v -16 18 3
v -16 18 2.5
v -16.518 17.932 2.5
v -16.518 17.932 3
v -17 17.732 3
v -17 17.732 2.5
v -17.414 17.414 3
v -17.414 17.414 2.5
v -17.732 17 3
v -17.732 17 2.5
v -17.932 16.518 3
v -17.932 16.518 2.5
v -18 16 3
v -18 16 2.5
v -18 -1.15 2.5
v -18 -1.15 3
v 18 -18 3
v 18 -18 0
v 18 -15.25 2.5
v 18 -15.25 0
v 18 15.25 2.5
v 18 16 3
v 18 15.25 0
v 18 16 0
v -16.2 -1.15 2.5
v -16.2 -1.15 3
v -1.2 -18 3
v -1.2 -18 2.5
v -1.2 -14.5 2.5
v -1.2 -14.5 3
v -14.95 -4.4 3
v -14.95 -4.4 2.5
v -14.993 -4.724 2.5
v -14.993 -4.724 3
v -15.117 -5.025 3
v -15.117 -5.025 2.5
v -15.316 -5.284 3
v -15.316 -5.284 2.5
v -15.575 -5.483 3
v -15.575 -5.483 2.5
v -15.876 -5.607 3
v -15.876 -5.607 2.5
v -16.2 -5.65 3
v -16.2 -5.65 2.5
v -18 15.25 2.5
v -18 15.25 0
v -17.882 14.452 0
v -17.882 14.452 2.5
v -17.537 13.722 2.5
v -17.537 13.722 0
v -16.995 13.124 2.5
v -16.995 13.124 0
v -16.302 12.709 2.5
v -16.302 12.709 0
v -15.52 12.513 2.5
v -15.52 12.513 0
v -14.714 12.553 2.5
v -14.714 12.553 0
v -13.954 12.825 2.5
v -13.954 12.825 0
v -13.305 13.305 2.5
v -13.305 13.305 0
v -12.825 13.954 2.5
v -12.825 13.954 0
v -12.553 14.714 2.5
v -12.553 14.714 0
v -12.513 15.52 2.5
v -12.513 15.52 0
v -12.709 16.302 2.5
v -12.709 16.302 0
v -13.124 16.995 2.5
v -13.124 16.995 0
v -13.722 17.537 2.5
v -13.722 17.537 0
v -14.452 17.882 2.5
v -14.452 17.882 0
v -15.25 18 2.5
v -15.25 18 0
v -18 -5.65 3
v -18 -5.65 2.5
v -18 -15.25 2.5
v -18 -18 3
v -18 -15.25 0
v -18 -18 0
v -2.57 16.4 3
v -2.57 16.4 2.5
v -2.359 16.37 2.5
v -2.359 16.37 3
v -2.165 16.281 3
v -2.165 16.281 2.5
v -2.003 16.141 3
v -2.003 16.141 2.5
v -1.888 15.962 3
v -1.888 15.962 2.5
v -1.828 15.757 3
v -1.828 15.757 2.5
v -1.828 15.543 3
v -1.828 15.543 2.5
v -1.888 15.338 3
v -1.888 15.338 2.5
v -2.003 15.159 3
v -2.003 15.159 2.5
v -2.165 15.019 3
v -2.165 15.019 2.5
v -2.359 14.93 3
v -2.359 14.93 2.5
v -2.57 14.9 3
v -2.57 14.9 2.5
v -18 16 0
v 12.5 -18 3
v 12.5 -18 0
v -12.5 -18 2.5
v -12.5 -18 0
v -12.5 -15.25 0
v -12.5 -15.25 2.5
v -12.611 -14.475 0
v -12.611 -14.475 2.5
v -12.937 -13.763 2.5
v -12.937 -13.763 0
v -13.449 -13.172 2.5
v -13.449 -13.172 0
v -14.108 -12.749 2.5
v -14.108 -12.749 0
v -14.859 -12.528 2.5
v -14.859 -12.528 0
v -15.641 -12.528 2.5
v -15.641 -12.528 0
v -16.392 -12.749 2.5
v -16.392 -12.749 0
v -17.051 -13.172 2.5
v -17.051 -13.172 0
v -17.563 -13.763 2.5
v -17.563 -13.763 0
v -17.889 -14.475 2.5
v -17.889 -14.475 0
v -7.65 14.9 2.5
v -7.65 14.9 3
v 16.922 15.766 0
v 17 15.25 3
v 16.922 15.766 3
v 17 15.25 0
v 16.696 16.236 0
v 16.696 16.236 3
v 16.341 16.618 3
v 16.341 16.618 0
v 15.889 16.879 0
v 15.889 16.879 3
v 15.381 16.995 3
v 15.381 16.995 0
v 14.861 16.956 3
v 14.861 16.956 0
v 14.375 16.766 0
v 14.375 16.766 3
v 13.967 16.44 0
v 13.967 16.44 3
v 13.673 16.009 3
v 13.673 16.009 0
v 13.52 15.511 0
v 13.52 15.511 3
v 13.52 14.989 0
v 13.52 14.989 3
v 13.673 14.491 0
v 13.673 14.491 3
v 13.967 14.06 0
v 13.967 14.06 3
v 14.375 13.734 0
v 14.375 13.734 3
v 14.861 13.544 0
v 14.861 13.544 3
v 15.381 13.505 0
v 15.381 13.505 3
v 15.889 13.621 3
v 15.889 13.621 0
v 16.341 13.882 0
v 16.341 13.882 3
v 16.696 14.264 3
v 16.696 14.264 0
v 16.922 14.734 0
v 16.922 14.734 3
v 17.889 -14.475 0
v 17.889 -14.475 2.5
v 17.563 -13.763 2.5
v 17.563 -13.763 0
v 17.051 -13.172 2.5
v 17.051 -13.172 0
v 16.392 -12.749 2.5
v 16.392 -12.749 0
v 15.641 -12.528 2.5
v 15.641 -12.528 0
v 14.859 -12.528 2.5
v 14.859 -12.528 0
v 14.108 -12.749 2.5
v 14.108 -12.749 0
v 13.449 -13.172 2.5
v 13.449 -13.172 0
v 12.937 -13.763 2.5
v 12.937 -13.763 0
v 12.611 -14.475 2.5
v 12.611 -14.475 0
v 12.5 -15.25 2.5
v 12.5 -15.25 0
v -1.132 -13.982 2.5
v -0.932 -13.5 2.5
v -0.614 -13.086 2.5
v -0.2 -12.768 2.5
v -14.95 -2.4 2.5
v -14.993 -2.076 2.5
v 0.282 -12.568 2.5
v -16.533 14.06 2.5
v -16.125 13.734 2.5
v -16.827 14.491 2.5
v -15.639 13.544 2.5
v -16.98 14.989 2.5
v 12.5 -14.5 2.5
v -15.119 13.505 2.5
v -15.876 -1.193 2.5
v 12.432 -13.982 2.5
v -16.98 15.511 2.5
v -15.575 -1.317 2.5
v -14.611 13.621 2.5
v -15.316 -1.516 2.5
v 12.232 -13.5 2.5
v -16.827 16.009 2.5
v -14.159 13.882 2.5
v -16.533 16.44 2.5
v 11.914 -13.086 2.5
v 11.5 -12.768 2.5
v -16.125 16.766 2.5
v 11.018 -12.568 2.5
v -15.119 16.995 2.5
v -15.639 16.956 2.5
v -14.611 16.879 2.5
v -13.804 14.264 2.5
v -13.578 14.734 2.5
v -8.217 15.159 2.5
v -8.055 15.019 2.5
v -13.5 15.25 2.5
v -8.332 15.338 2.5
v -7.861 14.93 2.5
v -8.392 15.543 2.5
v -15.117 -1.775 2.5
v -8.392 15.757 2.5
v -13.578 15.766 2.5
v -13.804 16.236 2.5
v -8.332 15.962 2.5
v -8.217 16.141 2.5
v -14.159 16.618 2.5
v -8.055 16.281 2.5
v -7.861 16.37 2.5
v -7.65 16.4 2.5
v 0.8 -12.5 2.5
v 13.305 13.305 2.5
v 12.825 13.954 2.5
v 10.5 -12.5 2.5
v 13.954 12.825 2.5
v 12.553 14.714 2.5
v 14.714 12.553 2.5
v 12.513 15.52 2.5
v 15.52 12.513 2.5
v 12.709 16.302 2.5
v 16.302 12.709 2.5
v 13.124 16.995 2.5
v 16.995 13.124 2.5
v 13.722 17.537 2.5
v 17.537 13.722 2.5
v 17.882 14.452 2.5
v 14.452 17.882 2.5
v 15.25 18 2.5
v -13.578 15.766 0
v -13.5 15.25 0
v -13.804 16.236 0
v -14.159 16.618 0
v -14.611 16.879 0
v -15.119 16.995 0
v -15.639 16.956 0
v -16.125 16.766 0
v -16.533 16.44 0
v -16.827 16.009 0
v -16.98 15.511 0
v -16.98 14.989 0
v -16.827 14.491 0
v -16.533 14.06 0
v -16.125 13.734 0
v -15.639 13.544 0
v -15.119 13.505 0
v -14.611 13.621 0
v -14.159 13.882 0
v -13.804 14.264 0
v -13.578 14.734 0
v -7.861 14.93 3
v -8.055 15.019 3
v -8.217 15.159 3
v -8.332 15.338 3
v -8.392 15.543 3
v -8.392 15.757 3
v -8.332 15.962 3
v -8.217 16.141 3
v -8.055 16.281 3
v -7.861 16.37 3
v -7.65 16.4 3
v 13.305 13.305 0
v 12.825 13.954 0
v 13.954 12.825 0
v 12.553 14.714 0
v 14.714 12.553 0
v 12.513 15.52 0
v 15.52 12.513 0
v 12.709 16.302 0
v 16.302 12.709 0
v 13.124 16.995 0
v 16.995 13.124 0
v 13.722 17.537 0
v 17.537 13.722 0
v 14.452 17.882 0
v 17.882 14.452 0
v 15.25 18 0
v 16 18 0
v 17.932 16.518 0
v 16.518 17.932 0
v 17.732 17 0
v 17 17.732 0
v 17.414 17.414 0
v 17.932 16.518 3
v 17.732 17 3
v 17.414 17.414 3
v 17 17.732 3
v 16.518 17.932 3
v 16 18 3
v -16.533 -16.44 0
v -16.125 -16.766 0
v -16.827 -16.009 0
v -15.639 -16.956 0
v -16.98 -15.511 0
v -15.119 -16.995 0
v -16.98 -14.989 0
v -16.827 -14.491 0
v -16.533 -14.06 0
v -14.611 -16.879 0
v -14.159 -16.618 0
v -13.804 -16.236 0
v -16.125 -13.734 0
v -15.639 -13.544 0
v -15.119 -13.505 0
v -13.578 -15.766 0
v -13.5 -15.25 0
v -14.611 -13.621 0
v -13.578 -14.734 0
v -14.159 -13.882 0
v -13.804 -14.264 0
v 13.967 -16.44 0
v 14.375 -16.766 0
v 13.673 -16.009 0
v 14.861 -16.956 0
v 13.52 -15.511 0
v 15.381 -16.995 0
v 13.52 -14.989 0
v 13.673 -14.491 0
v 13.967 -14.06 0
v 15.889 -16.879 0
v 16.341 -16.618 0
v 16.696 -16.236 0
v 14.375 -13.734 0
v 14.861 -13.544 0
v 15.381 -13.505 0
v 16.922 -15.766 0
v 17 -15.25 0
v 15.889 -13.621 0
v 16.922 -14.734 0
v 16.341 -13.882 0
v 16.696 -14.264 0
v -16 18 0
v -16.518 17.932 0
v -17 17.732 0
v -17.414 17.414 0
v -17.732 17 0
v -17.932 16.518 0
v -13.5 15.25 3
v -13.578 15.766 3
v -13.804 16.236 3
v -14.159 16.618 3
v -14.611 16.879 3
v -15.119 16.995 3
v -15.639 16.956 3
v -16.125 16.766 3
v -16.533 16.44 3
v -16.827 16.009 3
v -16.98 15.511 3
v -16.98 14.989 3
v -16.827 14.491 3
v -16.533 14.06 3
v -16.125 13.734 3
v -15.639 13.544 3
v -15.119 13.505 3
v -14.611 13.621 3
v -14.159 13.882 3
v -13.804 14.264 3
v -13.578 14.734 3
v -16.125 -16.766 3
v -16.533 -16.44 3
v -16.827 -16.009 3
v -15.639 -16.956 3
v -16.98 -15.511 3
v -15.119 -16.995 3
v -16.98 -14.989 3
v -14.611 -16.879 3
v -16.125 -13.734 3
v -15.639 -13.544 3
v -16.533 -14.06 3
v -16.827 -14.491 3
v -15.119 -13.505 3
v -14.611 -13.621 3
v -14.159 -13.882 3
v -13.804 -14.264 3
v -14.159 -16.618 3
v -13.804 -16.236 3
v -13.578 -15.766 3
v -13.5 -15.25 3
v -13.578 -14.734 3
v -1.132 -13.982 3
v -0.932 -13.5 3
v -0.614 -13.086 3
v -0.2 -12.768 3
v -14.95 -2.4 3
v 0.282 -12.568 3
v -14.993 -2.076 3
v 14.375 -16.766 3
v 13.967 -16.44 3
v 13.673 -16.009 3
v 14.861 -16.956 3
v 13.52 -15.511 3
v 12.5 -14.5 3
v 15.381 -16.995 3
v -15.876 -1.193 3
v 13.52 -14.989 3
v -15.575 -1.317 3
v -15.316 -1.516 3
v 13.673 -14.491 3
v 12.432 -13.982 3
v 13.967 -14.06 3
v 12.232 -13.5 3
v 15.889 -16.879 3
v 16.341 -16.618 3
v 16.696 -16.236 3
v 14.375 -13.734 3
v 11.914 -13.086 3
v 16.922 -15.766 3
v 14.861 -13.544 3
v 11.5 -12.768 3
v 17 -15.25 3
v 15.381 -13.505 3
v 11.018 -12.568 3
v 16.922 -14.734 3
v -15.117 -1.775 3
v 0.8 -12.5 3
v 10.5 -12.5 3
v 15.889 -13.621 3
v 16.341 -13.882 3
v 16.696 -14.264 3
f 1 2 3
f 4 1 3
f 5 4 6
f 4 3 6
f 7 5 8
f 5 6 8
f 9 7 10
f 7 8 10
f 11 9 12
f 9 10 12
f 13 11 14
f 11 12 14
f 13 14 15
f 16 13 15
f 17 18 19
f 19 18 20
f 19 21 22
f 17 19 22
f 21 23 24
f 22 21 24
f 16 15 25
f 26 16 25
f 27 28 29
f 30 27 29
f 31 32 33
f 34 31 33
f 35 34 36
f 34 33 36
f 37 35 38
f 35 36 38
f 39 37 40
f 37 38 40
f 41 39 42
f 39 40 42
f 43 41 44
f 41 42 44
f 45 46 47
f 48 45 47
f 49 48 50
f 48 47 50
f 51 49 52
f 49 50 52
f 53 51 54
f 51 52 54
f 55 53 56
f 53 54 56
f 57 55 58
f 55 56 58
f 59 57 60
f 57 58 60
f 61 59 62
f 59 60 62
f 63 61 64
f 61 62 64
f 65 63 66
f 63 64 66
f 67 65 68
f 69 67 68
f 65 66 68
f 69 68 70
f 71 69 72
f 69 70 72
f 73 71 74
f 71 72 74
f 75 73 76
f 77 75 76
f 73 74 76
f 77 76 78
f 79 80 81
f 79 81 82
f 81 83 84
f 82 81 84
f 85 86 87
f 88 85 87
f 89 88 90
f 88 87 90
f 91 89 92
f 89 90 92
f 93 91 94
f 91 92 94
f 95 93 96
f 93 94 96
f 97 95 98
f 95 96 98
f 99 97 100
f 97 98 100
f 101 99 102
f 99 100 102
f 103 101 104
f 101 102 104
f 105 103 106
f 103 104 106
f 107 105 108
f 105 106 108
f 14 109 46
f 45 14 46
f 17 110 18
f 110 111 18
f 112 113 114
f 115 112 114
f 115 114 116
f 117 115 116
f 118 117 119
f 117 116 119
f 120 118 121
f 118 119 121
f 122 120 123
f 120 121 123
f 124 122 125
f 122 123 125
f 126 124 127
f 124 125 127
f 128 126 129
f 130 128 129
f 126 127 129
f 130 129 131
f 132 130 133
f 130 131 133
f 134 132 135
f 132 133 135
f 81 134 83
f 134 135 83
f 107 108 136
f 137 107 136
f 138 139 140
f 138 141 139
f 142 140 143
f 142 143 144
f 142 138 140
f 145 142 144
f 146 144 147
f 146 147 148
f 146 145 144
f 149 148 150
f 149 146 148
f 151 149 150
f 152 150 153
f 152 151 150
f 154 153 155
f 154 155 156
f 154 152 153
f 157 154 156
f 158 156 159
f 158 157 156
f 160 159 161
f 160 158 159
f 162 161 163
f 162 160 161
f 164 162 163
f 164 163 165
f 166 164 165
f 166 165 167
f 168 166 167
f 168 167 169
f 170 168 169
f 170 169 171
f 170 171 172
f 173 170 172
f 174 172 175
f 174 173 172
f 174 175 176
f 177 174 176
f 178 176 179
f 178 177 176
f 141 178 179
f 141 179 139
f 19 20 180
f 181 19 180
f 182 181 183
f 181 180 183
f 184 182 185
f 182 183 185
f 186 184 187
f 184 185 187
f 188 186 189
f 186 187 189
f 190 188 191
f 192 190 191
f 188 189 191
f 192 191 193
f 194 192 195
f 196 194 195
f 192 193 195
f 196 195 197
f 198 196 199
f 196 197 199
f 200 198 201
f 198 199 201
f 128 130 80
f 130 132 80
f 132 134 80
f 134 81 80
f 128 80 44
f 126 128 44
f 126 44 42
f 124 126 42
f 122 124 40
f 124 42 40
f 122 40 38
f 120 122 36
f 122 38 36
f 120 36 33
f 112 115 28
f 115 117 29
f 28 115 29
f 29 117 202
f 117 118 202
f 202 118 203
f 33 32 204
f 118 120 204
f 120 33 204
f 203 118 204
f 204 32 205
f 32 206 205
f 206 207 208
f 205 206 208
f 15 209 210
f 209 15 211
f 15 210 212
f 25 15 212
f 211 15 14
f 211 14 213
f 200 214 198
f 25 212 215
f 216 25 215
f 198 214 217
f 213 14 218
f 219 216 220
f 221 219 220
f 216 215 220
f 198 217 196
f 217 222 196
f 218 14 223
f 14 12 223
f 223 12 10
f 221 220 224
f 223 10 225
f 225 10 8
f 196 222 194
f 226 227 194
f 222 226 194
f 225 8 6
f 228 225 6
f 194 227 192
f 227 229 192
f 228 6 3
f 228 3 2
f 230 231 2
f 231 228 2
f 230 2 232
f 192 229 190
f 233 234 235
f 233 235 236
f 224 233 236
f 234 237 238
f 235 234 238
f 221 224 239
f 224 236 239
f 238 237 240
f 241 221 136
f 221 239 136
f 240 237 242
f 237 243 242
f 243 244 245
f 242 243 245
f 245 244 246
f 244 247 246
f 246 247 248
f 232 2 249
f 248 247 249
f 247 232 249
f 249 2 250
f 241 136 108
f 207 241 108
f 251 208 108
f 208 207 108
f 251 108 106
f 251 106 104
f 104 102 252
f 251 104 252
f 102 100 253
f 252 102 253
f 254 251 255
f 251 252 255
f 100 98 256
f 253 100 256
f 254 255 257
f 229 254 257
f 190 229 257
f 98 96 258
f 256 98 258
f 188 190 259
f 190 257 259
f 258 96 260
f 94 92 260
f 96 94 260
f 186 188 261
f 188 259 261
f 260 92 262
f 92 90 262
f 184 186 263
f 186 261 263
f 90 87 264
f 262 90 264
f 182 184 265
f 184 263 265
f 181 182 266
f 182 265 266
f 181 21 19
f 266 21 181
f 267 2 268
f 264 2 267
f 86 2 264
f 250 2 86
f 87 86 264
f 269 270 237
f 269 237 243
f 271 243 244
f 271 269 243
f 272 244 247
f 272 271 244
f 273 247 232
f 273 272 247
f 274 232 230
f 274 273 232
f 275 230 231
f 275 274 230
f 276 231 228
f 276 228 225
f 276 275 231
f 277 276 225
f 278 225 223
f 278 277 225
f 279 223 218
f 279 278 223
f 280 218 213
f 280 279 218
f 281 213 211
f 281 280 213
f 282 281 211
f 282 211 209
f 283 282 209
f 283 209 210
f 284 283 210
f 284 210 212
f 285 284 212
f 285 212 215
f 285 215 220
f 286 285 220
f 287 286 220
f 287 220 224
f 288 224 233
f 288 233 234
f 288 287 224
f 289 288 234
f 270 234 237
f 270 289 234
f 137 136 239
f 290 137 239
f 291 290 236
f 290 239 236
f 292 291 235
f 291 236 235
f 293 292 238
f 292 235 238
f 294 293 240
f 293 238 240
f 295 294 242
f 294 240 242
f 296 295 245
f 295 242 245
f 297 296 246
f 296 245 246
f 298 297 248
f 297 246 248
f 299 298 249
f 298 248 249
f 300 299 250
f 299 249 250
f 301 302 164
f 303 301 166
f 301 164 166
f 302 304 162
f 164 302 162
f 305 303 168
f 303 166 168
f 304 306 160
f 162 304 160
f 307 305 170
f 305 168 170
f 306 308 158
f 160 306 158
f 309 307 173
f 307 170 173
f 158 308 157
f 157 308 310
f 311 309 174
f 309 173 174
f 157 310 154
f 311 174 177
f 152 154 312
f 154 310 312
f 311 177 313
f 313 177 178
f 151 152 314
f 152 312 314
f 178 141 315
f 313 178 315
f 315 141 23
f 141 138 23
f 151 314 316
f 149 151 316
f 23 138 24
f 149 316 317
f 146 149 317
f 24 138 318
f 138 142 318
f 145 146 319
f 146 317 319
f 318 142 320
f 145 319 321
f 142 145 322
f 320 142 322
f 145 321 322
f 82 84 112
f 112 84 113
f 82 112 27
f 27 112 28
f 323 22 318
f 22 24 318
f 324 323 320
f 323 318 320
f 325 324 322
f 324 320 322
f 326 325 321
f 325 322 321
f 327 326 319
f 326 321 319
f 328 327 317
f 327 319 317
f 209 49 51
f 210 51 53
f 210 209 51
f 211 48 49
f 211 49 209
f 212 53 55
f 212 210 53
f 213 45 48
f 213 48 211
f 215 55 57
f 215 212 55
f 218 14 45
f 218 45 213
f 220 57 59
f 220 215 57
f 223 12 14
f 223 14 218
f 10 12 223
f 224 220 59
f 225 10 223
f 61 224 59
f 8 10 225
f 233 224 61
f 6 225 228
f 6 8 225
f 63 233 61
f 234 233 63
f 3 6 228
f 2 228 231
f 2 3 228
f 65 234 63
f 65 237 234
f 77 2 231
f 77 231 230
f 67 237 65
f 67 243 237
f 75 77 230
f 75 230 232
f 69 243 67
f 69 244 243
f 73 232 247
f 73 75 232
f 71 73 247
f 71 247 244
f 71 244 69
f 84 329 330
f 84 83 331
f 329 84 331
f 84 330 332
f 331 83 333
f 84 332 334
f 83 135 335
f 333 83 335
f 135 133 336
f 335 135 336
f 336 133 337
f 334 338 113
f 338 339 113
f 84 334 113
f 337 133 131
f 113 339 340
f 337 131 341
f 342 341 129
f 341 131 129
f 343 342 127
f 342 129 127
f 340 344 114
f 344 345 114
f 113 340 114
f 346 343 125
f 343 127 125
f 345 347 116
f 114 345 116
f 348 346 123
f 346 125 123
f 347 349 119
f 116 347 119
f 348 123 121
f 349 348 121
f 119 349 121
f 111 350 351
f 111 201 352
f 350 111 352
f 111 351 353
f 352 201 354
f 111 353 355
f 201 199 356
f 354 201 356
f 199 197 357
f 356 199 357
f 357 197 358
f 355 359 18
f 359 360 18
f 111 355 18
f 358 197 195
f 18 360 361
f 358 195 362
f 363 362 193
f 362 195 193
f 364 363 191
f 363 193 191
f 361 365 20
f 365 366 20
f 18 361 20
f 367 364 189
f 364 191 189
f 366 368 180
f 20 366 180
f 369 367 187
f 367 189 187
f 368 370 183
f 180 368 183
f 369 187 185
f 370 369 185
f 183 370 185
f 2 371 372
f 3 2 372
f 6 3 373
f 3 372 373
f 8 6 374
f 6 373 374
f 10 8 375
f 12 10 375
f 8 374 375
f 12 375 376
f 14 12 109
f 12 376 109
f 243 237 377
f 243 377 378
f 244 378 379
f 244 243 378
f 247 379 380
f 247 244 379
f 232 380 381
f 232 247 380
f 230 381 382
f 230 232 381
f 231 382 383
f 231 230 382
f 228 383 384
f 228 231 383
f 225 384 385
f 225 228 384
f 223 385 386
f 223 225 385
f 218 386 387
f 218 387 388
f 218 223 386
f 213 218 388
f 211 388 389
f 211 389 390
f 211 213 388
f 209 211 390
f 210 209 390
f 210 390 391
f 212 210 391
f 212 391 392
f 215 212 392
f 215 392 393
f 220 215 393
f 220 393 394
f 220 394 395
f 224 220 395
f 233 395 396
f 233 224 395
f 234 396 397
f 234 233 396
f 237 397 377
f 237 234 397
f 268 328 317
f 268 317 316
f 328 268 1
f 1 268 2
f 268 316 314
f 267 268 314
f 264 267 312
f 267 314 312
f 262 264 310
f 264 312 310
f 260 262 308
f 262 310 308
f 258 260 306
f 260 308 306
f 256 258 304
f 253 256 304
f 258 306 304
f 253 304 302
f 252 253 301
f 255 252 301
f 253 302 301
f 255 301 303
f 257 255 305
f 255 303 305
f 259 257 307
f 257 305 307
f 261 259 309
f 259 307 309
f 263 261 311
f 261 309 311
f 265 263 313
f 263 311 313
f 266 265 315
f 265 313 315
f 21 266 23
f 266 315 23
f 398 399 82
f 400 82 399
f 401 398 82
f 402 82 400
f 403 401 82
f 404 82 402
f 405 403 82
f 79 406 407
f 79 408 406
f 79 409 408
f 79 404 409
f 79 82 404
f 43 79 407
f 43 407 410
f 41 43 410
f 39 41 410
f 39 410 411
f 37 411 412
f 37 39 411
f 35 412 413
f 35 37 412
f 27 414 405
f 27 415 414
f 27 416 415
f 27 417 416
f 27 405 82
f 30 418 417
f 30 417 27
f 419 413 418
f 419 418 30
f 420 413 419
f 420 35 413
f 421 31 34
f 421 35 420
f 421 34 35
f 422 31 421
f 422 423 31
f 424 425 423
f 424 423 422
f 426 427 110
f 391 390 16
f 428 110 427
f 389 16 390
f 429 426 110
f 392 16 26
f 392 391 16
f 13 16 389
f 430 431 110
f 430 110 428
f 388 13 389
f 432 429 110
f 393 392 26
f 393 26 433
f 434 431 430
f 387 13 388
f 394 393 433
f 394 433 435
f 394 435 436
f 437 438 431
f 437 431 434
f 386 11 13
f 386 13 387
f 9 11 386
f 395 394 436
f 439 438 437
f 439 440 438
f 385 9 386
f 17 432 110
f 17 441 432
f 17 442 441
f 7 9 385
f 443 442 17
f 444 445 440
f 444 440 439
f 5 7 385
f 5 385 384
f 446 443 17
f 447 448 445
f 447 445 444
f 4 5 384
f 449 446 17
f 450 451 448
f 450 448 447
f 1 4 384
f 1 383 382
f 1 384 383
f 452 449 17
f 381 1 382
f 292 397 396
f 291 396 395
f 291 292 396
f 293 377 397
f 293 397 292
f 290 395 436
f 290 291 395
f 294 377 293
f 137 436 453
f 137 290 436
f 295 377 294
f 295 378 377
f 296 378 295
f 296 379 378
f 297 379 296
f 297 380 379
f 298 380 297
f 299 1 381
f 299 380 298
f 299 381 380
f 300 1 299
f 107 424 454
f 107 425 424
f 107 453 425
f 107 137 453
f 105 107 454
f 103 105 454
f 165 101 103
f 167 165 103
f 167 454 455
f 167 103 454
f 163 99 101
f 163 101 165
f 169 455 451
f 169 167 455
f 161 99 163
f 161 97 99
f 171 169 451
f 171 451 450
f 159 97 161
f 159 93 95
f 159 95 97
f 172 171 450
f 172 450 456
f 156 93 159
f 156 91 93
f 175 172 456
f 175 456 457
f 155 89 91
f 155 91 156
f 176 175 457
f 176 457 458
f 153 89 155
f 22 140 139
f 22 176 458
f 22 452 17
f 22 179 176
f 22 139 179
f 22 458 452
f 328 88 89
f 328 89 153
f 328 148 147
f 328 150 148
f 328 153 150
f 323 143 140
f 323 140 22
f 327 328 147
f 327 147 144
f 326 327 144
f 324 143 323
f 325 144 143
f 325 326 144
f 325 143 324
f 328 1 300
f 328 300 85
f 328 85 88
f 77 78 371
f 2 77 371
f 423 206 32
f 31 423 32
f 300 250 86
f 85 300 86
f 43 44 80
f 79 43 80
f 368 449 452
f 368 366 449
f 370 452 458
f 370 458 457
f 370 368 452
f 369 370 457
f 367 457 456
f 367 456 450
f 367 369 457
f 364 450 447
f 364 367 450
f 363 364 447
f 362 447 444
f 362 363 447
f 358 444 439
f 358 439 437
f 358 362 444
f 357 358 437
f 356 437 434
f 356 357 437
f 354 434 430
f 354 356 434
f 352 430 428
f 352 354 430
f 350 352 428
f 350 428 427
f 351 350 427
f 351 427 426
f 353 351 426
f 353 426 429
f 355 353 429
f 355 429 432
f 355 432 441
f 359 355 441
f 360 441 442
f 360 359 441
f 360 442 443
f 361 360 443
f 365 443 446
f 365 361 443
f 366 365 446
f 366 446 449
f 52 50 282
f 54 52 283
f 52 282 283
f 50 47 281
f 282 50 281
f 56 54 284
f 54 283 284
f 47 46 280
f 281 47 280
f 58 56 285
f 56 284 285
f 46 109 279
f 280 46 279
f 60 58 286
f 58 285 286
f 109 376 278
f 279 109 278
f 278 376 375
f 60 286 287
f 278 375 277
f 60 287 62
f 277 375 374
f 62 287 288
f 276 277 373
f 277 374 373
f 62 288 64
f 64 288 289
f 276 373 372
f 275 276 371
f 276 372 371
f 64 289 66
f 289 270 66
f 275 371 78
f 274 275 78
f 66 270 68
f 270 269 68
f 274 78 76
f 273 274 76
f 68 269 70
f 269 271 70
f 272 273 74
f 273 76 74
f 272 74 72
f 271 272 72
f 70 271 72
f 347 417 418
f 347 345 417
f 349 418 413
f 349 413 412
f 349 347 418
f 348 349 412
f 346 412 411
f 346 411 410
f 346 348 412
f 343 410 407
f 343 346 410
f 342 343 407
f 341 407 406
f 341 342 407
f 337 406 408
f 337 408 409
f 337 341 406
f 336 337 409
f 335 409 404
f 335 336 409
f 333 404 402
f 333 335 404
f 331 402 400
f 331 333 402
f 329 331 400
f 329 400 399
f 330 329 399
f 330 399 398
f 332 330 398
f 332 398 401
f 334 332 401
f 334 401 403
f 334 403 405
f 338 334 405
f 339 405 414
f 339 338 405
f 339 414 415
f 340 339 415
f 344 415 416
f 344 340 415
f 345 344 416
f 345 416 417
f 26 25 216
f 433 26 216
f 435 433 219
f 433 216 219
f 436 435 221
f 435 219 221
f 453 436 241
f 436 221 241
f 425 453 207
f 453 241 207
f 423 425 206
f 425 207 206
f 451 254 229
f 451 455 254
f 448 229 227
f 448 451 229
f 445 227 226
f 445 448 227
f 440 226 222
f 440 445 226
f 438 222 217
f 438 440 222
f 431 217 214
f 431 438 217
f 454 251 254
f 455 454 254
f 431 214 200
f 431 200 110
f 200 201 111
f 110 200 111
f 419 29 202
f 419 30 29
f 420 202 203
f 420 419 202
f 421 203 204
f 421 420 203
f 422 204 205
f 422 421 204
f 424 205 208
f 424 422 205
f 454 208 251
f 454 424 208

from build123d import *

# Parameters (mm, degrees)
SKETCH2_R         = 1.75
STANDOFFS_DEPTH   = 2.5
STANDOFFS_2_DEPTH = 2.5
STANDOFFS_3_DEPTH = 2.5
STANDOFFS_4_DEPTH = 2.5
SKETCH3_R         = 1.75
COVER_DEPTH       = 0.5
FILLETS_R         = 2


with BuildPart() as part:
    # Sketch2 → Standoffs (new body)
    with BuildSketch(Plane.XY):
        with BuildLine():
            Line((18, -18), (18, -15.25))
            ThreePointArc((18, -15.25), (15.25, -12.5), (12.5, -15.25))
            Line((12.5, -15.25), (12.5, -18))
            Line((12.5, -18), (18, -18))
        make_face()
        with Locations((15.25, -15.25)):
            Circle(SKETCH2_R, mode=Mode.SUBTRACT)
    extrude(amount=STANDOFFS_DEPTH)



with BuildPart() as body_2:
    # Sketch2 → Standoffs 2 (new body)
    with BuildSketch(Plane.XY):
        with BuildLine():
            Line((-12.5, -18), (-12.5, -15.25))
            ThreePointArc((-12.5, -15.25), (-15.250000002, -12.5), (-18, -15.250000004))
            Line((-18, -15.250000004), (-18, -18))
            Line((-18, -18), (-12.5, -18))
        make_face()
        with Locations((-15.25, -15.25)):
            Circle(SKETCH2_R, mode=Mode.SUBTRACT)
    extrude(amount=STANDOFFS_2_DEPTH)


with BuildPart() as body_3:
    # Sketch2 → Standoffs 3 (new body)
    with BuildSketch(Plane.XY):
        with BuildLine():
            Line((16, 18), (15.25, 18))
            ThreePointArc((15.25, 18), (13.305456352, 13.305456352), (18, 15.25))
            Line((18, 15.25), (18, 16))
            ThreePointArc((18, 16), (17.414213562, 17.414213562), (16, 18))
        make_face()
        with Locations((15.25, 15.25)):
            Circle(SKETCH2_R, mode=Mode.SUBTRACT)
    extrude(amount=STANDOFFS_3_DEPTH)


with BuildPart() as body_4:
    # Sketch2 → Standoffs 4 (new body)
    with BuildSketch(Plane.XY):
        with BuildLine():
            Line((-18, 16), (-18, 15.25))
            ThreePointArc((-18, 15.25), (-13.305456377, 13.305456326), (-15.249999928, 18))
            Line((-15.249999928, 18), (-16, 18))
            ThreePointArc((-16, 18), (-17.414213562, 17.414213562), (-18, 16))
        make_face()
        with Locations((-15.25, 15.25)):
            Circle(SKETCH2_R, mode=Mode.SUBTRACT)
    extrude(amount=STANDOFFS_4_DEPTH)


with BuildPart() as part_1:
    add(part.part)

    add(body_3.part)  # Cover merges body 3

    add(body_2.part)  # Cover merges body 2
    # Sketch3 → Cover (add)
    with BuildSketch(Plane.XY.offset(2.5)):
        with BuildLine():
            Line((-18, -5.65), (-18, -18))
            Line((-18, -18), (-1.2, -18))
            Line((-1.2, -18), (-1.2, -12.5))
            Line((-1.2, -12.5), (12.5, -12.5))
            Line((12.5, -12.5), (12.5, -18))
            Line((12.5, -18), (18, -18))
            Line((18, -18), (18, 16))
            ThreePointArc((18, 16), (17.414213562, 17.414213562), (16, 18))
            Line((16, 18), (-16, 18))
            ThreePointArc((-16, 18), (-17.414213562, 17.414213562), (-18, 16))
            Line((-18, 16), (-18, -1.15))
            Line((-18, -1.15), (-16.2, -1.15))
            ThreePointArc((-16.2, -1.15), (-15.316116524, -1.516116524), (-14.95, -2.4))
            Line((-14.95, -2.4), (-14.95, -4.4))
            ThreePointArc((-14.95, -4.4), (-15.316116524, -5.283883476), (-16.2, -5.65))
            Line((-16.2, -5.65), (-18, -5.65))
        make_face()
        with Locations((-15.25, -15.25)):
            Circle(SKETCH3_R, mode=Mode.SUBTRACT)
        with BuildLine():
            ThreePointArc((-7.65, 14.9), (-8.4, 15.65), (-7.65, 16.4))
            Line((-7.65, 16.4), (-2.57, 16.4))
            ThreePointArc((-2.57, 16.4), (-1.82, 15.65), (-2.57, 14.9))
            Line((-2.57, 14.9), (-7.65, 14.9))
        make_face(mode=Mode.SUBTRACT)
        with Locations((-15.25, 15.25)):
            Circle(SKETCH3_R, mode=Mode.SUBTRACT)
        with Locations((15.25, -15.25)):
            Circle(SKETCH3_R, mode=Mode.SUBTRACT)
        with Locations((15.25, 15.25)):
            Circle(SKETCH3_R, mode=Mode.SUBTRACT)
    extrude(amount=COVER_DEPTH)

    # Fillets
    fillets_edges = [part_1.edges().sort_by_distance(p)[0] for p in [
        (-1.2, -12.5, 2.75),
        (12.5, -12.5, 2.75),
    ]]
    fillet(fillets_edges, radius=FILLETS_R)


solid = Compound([body_4.part, part_1.part])
